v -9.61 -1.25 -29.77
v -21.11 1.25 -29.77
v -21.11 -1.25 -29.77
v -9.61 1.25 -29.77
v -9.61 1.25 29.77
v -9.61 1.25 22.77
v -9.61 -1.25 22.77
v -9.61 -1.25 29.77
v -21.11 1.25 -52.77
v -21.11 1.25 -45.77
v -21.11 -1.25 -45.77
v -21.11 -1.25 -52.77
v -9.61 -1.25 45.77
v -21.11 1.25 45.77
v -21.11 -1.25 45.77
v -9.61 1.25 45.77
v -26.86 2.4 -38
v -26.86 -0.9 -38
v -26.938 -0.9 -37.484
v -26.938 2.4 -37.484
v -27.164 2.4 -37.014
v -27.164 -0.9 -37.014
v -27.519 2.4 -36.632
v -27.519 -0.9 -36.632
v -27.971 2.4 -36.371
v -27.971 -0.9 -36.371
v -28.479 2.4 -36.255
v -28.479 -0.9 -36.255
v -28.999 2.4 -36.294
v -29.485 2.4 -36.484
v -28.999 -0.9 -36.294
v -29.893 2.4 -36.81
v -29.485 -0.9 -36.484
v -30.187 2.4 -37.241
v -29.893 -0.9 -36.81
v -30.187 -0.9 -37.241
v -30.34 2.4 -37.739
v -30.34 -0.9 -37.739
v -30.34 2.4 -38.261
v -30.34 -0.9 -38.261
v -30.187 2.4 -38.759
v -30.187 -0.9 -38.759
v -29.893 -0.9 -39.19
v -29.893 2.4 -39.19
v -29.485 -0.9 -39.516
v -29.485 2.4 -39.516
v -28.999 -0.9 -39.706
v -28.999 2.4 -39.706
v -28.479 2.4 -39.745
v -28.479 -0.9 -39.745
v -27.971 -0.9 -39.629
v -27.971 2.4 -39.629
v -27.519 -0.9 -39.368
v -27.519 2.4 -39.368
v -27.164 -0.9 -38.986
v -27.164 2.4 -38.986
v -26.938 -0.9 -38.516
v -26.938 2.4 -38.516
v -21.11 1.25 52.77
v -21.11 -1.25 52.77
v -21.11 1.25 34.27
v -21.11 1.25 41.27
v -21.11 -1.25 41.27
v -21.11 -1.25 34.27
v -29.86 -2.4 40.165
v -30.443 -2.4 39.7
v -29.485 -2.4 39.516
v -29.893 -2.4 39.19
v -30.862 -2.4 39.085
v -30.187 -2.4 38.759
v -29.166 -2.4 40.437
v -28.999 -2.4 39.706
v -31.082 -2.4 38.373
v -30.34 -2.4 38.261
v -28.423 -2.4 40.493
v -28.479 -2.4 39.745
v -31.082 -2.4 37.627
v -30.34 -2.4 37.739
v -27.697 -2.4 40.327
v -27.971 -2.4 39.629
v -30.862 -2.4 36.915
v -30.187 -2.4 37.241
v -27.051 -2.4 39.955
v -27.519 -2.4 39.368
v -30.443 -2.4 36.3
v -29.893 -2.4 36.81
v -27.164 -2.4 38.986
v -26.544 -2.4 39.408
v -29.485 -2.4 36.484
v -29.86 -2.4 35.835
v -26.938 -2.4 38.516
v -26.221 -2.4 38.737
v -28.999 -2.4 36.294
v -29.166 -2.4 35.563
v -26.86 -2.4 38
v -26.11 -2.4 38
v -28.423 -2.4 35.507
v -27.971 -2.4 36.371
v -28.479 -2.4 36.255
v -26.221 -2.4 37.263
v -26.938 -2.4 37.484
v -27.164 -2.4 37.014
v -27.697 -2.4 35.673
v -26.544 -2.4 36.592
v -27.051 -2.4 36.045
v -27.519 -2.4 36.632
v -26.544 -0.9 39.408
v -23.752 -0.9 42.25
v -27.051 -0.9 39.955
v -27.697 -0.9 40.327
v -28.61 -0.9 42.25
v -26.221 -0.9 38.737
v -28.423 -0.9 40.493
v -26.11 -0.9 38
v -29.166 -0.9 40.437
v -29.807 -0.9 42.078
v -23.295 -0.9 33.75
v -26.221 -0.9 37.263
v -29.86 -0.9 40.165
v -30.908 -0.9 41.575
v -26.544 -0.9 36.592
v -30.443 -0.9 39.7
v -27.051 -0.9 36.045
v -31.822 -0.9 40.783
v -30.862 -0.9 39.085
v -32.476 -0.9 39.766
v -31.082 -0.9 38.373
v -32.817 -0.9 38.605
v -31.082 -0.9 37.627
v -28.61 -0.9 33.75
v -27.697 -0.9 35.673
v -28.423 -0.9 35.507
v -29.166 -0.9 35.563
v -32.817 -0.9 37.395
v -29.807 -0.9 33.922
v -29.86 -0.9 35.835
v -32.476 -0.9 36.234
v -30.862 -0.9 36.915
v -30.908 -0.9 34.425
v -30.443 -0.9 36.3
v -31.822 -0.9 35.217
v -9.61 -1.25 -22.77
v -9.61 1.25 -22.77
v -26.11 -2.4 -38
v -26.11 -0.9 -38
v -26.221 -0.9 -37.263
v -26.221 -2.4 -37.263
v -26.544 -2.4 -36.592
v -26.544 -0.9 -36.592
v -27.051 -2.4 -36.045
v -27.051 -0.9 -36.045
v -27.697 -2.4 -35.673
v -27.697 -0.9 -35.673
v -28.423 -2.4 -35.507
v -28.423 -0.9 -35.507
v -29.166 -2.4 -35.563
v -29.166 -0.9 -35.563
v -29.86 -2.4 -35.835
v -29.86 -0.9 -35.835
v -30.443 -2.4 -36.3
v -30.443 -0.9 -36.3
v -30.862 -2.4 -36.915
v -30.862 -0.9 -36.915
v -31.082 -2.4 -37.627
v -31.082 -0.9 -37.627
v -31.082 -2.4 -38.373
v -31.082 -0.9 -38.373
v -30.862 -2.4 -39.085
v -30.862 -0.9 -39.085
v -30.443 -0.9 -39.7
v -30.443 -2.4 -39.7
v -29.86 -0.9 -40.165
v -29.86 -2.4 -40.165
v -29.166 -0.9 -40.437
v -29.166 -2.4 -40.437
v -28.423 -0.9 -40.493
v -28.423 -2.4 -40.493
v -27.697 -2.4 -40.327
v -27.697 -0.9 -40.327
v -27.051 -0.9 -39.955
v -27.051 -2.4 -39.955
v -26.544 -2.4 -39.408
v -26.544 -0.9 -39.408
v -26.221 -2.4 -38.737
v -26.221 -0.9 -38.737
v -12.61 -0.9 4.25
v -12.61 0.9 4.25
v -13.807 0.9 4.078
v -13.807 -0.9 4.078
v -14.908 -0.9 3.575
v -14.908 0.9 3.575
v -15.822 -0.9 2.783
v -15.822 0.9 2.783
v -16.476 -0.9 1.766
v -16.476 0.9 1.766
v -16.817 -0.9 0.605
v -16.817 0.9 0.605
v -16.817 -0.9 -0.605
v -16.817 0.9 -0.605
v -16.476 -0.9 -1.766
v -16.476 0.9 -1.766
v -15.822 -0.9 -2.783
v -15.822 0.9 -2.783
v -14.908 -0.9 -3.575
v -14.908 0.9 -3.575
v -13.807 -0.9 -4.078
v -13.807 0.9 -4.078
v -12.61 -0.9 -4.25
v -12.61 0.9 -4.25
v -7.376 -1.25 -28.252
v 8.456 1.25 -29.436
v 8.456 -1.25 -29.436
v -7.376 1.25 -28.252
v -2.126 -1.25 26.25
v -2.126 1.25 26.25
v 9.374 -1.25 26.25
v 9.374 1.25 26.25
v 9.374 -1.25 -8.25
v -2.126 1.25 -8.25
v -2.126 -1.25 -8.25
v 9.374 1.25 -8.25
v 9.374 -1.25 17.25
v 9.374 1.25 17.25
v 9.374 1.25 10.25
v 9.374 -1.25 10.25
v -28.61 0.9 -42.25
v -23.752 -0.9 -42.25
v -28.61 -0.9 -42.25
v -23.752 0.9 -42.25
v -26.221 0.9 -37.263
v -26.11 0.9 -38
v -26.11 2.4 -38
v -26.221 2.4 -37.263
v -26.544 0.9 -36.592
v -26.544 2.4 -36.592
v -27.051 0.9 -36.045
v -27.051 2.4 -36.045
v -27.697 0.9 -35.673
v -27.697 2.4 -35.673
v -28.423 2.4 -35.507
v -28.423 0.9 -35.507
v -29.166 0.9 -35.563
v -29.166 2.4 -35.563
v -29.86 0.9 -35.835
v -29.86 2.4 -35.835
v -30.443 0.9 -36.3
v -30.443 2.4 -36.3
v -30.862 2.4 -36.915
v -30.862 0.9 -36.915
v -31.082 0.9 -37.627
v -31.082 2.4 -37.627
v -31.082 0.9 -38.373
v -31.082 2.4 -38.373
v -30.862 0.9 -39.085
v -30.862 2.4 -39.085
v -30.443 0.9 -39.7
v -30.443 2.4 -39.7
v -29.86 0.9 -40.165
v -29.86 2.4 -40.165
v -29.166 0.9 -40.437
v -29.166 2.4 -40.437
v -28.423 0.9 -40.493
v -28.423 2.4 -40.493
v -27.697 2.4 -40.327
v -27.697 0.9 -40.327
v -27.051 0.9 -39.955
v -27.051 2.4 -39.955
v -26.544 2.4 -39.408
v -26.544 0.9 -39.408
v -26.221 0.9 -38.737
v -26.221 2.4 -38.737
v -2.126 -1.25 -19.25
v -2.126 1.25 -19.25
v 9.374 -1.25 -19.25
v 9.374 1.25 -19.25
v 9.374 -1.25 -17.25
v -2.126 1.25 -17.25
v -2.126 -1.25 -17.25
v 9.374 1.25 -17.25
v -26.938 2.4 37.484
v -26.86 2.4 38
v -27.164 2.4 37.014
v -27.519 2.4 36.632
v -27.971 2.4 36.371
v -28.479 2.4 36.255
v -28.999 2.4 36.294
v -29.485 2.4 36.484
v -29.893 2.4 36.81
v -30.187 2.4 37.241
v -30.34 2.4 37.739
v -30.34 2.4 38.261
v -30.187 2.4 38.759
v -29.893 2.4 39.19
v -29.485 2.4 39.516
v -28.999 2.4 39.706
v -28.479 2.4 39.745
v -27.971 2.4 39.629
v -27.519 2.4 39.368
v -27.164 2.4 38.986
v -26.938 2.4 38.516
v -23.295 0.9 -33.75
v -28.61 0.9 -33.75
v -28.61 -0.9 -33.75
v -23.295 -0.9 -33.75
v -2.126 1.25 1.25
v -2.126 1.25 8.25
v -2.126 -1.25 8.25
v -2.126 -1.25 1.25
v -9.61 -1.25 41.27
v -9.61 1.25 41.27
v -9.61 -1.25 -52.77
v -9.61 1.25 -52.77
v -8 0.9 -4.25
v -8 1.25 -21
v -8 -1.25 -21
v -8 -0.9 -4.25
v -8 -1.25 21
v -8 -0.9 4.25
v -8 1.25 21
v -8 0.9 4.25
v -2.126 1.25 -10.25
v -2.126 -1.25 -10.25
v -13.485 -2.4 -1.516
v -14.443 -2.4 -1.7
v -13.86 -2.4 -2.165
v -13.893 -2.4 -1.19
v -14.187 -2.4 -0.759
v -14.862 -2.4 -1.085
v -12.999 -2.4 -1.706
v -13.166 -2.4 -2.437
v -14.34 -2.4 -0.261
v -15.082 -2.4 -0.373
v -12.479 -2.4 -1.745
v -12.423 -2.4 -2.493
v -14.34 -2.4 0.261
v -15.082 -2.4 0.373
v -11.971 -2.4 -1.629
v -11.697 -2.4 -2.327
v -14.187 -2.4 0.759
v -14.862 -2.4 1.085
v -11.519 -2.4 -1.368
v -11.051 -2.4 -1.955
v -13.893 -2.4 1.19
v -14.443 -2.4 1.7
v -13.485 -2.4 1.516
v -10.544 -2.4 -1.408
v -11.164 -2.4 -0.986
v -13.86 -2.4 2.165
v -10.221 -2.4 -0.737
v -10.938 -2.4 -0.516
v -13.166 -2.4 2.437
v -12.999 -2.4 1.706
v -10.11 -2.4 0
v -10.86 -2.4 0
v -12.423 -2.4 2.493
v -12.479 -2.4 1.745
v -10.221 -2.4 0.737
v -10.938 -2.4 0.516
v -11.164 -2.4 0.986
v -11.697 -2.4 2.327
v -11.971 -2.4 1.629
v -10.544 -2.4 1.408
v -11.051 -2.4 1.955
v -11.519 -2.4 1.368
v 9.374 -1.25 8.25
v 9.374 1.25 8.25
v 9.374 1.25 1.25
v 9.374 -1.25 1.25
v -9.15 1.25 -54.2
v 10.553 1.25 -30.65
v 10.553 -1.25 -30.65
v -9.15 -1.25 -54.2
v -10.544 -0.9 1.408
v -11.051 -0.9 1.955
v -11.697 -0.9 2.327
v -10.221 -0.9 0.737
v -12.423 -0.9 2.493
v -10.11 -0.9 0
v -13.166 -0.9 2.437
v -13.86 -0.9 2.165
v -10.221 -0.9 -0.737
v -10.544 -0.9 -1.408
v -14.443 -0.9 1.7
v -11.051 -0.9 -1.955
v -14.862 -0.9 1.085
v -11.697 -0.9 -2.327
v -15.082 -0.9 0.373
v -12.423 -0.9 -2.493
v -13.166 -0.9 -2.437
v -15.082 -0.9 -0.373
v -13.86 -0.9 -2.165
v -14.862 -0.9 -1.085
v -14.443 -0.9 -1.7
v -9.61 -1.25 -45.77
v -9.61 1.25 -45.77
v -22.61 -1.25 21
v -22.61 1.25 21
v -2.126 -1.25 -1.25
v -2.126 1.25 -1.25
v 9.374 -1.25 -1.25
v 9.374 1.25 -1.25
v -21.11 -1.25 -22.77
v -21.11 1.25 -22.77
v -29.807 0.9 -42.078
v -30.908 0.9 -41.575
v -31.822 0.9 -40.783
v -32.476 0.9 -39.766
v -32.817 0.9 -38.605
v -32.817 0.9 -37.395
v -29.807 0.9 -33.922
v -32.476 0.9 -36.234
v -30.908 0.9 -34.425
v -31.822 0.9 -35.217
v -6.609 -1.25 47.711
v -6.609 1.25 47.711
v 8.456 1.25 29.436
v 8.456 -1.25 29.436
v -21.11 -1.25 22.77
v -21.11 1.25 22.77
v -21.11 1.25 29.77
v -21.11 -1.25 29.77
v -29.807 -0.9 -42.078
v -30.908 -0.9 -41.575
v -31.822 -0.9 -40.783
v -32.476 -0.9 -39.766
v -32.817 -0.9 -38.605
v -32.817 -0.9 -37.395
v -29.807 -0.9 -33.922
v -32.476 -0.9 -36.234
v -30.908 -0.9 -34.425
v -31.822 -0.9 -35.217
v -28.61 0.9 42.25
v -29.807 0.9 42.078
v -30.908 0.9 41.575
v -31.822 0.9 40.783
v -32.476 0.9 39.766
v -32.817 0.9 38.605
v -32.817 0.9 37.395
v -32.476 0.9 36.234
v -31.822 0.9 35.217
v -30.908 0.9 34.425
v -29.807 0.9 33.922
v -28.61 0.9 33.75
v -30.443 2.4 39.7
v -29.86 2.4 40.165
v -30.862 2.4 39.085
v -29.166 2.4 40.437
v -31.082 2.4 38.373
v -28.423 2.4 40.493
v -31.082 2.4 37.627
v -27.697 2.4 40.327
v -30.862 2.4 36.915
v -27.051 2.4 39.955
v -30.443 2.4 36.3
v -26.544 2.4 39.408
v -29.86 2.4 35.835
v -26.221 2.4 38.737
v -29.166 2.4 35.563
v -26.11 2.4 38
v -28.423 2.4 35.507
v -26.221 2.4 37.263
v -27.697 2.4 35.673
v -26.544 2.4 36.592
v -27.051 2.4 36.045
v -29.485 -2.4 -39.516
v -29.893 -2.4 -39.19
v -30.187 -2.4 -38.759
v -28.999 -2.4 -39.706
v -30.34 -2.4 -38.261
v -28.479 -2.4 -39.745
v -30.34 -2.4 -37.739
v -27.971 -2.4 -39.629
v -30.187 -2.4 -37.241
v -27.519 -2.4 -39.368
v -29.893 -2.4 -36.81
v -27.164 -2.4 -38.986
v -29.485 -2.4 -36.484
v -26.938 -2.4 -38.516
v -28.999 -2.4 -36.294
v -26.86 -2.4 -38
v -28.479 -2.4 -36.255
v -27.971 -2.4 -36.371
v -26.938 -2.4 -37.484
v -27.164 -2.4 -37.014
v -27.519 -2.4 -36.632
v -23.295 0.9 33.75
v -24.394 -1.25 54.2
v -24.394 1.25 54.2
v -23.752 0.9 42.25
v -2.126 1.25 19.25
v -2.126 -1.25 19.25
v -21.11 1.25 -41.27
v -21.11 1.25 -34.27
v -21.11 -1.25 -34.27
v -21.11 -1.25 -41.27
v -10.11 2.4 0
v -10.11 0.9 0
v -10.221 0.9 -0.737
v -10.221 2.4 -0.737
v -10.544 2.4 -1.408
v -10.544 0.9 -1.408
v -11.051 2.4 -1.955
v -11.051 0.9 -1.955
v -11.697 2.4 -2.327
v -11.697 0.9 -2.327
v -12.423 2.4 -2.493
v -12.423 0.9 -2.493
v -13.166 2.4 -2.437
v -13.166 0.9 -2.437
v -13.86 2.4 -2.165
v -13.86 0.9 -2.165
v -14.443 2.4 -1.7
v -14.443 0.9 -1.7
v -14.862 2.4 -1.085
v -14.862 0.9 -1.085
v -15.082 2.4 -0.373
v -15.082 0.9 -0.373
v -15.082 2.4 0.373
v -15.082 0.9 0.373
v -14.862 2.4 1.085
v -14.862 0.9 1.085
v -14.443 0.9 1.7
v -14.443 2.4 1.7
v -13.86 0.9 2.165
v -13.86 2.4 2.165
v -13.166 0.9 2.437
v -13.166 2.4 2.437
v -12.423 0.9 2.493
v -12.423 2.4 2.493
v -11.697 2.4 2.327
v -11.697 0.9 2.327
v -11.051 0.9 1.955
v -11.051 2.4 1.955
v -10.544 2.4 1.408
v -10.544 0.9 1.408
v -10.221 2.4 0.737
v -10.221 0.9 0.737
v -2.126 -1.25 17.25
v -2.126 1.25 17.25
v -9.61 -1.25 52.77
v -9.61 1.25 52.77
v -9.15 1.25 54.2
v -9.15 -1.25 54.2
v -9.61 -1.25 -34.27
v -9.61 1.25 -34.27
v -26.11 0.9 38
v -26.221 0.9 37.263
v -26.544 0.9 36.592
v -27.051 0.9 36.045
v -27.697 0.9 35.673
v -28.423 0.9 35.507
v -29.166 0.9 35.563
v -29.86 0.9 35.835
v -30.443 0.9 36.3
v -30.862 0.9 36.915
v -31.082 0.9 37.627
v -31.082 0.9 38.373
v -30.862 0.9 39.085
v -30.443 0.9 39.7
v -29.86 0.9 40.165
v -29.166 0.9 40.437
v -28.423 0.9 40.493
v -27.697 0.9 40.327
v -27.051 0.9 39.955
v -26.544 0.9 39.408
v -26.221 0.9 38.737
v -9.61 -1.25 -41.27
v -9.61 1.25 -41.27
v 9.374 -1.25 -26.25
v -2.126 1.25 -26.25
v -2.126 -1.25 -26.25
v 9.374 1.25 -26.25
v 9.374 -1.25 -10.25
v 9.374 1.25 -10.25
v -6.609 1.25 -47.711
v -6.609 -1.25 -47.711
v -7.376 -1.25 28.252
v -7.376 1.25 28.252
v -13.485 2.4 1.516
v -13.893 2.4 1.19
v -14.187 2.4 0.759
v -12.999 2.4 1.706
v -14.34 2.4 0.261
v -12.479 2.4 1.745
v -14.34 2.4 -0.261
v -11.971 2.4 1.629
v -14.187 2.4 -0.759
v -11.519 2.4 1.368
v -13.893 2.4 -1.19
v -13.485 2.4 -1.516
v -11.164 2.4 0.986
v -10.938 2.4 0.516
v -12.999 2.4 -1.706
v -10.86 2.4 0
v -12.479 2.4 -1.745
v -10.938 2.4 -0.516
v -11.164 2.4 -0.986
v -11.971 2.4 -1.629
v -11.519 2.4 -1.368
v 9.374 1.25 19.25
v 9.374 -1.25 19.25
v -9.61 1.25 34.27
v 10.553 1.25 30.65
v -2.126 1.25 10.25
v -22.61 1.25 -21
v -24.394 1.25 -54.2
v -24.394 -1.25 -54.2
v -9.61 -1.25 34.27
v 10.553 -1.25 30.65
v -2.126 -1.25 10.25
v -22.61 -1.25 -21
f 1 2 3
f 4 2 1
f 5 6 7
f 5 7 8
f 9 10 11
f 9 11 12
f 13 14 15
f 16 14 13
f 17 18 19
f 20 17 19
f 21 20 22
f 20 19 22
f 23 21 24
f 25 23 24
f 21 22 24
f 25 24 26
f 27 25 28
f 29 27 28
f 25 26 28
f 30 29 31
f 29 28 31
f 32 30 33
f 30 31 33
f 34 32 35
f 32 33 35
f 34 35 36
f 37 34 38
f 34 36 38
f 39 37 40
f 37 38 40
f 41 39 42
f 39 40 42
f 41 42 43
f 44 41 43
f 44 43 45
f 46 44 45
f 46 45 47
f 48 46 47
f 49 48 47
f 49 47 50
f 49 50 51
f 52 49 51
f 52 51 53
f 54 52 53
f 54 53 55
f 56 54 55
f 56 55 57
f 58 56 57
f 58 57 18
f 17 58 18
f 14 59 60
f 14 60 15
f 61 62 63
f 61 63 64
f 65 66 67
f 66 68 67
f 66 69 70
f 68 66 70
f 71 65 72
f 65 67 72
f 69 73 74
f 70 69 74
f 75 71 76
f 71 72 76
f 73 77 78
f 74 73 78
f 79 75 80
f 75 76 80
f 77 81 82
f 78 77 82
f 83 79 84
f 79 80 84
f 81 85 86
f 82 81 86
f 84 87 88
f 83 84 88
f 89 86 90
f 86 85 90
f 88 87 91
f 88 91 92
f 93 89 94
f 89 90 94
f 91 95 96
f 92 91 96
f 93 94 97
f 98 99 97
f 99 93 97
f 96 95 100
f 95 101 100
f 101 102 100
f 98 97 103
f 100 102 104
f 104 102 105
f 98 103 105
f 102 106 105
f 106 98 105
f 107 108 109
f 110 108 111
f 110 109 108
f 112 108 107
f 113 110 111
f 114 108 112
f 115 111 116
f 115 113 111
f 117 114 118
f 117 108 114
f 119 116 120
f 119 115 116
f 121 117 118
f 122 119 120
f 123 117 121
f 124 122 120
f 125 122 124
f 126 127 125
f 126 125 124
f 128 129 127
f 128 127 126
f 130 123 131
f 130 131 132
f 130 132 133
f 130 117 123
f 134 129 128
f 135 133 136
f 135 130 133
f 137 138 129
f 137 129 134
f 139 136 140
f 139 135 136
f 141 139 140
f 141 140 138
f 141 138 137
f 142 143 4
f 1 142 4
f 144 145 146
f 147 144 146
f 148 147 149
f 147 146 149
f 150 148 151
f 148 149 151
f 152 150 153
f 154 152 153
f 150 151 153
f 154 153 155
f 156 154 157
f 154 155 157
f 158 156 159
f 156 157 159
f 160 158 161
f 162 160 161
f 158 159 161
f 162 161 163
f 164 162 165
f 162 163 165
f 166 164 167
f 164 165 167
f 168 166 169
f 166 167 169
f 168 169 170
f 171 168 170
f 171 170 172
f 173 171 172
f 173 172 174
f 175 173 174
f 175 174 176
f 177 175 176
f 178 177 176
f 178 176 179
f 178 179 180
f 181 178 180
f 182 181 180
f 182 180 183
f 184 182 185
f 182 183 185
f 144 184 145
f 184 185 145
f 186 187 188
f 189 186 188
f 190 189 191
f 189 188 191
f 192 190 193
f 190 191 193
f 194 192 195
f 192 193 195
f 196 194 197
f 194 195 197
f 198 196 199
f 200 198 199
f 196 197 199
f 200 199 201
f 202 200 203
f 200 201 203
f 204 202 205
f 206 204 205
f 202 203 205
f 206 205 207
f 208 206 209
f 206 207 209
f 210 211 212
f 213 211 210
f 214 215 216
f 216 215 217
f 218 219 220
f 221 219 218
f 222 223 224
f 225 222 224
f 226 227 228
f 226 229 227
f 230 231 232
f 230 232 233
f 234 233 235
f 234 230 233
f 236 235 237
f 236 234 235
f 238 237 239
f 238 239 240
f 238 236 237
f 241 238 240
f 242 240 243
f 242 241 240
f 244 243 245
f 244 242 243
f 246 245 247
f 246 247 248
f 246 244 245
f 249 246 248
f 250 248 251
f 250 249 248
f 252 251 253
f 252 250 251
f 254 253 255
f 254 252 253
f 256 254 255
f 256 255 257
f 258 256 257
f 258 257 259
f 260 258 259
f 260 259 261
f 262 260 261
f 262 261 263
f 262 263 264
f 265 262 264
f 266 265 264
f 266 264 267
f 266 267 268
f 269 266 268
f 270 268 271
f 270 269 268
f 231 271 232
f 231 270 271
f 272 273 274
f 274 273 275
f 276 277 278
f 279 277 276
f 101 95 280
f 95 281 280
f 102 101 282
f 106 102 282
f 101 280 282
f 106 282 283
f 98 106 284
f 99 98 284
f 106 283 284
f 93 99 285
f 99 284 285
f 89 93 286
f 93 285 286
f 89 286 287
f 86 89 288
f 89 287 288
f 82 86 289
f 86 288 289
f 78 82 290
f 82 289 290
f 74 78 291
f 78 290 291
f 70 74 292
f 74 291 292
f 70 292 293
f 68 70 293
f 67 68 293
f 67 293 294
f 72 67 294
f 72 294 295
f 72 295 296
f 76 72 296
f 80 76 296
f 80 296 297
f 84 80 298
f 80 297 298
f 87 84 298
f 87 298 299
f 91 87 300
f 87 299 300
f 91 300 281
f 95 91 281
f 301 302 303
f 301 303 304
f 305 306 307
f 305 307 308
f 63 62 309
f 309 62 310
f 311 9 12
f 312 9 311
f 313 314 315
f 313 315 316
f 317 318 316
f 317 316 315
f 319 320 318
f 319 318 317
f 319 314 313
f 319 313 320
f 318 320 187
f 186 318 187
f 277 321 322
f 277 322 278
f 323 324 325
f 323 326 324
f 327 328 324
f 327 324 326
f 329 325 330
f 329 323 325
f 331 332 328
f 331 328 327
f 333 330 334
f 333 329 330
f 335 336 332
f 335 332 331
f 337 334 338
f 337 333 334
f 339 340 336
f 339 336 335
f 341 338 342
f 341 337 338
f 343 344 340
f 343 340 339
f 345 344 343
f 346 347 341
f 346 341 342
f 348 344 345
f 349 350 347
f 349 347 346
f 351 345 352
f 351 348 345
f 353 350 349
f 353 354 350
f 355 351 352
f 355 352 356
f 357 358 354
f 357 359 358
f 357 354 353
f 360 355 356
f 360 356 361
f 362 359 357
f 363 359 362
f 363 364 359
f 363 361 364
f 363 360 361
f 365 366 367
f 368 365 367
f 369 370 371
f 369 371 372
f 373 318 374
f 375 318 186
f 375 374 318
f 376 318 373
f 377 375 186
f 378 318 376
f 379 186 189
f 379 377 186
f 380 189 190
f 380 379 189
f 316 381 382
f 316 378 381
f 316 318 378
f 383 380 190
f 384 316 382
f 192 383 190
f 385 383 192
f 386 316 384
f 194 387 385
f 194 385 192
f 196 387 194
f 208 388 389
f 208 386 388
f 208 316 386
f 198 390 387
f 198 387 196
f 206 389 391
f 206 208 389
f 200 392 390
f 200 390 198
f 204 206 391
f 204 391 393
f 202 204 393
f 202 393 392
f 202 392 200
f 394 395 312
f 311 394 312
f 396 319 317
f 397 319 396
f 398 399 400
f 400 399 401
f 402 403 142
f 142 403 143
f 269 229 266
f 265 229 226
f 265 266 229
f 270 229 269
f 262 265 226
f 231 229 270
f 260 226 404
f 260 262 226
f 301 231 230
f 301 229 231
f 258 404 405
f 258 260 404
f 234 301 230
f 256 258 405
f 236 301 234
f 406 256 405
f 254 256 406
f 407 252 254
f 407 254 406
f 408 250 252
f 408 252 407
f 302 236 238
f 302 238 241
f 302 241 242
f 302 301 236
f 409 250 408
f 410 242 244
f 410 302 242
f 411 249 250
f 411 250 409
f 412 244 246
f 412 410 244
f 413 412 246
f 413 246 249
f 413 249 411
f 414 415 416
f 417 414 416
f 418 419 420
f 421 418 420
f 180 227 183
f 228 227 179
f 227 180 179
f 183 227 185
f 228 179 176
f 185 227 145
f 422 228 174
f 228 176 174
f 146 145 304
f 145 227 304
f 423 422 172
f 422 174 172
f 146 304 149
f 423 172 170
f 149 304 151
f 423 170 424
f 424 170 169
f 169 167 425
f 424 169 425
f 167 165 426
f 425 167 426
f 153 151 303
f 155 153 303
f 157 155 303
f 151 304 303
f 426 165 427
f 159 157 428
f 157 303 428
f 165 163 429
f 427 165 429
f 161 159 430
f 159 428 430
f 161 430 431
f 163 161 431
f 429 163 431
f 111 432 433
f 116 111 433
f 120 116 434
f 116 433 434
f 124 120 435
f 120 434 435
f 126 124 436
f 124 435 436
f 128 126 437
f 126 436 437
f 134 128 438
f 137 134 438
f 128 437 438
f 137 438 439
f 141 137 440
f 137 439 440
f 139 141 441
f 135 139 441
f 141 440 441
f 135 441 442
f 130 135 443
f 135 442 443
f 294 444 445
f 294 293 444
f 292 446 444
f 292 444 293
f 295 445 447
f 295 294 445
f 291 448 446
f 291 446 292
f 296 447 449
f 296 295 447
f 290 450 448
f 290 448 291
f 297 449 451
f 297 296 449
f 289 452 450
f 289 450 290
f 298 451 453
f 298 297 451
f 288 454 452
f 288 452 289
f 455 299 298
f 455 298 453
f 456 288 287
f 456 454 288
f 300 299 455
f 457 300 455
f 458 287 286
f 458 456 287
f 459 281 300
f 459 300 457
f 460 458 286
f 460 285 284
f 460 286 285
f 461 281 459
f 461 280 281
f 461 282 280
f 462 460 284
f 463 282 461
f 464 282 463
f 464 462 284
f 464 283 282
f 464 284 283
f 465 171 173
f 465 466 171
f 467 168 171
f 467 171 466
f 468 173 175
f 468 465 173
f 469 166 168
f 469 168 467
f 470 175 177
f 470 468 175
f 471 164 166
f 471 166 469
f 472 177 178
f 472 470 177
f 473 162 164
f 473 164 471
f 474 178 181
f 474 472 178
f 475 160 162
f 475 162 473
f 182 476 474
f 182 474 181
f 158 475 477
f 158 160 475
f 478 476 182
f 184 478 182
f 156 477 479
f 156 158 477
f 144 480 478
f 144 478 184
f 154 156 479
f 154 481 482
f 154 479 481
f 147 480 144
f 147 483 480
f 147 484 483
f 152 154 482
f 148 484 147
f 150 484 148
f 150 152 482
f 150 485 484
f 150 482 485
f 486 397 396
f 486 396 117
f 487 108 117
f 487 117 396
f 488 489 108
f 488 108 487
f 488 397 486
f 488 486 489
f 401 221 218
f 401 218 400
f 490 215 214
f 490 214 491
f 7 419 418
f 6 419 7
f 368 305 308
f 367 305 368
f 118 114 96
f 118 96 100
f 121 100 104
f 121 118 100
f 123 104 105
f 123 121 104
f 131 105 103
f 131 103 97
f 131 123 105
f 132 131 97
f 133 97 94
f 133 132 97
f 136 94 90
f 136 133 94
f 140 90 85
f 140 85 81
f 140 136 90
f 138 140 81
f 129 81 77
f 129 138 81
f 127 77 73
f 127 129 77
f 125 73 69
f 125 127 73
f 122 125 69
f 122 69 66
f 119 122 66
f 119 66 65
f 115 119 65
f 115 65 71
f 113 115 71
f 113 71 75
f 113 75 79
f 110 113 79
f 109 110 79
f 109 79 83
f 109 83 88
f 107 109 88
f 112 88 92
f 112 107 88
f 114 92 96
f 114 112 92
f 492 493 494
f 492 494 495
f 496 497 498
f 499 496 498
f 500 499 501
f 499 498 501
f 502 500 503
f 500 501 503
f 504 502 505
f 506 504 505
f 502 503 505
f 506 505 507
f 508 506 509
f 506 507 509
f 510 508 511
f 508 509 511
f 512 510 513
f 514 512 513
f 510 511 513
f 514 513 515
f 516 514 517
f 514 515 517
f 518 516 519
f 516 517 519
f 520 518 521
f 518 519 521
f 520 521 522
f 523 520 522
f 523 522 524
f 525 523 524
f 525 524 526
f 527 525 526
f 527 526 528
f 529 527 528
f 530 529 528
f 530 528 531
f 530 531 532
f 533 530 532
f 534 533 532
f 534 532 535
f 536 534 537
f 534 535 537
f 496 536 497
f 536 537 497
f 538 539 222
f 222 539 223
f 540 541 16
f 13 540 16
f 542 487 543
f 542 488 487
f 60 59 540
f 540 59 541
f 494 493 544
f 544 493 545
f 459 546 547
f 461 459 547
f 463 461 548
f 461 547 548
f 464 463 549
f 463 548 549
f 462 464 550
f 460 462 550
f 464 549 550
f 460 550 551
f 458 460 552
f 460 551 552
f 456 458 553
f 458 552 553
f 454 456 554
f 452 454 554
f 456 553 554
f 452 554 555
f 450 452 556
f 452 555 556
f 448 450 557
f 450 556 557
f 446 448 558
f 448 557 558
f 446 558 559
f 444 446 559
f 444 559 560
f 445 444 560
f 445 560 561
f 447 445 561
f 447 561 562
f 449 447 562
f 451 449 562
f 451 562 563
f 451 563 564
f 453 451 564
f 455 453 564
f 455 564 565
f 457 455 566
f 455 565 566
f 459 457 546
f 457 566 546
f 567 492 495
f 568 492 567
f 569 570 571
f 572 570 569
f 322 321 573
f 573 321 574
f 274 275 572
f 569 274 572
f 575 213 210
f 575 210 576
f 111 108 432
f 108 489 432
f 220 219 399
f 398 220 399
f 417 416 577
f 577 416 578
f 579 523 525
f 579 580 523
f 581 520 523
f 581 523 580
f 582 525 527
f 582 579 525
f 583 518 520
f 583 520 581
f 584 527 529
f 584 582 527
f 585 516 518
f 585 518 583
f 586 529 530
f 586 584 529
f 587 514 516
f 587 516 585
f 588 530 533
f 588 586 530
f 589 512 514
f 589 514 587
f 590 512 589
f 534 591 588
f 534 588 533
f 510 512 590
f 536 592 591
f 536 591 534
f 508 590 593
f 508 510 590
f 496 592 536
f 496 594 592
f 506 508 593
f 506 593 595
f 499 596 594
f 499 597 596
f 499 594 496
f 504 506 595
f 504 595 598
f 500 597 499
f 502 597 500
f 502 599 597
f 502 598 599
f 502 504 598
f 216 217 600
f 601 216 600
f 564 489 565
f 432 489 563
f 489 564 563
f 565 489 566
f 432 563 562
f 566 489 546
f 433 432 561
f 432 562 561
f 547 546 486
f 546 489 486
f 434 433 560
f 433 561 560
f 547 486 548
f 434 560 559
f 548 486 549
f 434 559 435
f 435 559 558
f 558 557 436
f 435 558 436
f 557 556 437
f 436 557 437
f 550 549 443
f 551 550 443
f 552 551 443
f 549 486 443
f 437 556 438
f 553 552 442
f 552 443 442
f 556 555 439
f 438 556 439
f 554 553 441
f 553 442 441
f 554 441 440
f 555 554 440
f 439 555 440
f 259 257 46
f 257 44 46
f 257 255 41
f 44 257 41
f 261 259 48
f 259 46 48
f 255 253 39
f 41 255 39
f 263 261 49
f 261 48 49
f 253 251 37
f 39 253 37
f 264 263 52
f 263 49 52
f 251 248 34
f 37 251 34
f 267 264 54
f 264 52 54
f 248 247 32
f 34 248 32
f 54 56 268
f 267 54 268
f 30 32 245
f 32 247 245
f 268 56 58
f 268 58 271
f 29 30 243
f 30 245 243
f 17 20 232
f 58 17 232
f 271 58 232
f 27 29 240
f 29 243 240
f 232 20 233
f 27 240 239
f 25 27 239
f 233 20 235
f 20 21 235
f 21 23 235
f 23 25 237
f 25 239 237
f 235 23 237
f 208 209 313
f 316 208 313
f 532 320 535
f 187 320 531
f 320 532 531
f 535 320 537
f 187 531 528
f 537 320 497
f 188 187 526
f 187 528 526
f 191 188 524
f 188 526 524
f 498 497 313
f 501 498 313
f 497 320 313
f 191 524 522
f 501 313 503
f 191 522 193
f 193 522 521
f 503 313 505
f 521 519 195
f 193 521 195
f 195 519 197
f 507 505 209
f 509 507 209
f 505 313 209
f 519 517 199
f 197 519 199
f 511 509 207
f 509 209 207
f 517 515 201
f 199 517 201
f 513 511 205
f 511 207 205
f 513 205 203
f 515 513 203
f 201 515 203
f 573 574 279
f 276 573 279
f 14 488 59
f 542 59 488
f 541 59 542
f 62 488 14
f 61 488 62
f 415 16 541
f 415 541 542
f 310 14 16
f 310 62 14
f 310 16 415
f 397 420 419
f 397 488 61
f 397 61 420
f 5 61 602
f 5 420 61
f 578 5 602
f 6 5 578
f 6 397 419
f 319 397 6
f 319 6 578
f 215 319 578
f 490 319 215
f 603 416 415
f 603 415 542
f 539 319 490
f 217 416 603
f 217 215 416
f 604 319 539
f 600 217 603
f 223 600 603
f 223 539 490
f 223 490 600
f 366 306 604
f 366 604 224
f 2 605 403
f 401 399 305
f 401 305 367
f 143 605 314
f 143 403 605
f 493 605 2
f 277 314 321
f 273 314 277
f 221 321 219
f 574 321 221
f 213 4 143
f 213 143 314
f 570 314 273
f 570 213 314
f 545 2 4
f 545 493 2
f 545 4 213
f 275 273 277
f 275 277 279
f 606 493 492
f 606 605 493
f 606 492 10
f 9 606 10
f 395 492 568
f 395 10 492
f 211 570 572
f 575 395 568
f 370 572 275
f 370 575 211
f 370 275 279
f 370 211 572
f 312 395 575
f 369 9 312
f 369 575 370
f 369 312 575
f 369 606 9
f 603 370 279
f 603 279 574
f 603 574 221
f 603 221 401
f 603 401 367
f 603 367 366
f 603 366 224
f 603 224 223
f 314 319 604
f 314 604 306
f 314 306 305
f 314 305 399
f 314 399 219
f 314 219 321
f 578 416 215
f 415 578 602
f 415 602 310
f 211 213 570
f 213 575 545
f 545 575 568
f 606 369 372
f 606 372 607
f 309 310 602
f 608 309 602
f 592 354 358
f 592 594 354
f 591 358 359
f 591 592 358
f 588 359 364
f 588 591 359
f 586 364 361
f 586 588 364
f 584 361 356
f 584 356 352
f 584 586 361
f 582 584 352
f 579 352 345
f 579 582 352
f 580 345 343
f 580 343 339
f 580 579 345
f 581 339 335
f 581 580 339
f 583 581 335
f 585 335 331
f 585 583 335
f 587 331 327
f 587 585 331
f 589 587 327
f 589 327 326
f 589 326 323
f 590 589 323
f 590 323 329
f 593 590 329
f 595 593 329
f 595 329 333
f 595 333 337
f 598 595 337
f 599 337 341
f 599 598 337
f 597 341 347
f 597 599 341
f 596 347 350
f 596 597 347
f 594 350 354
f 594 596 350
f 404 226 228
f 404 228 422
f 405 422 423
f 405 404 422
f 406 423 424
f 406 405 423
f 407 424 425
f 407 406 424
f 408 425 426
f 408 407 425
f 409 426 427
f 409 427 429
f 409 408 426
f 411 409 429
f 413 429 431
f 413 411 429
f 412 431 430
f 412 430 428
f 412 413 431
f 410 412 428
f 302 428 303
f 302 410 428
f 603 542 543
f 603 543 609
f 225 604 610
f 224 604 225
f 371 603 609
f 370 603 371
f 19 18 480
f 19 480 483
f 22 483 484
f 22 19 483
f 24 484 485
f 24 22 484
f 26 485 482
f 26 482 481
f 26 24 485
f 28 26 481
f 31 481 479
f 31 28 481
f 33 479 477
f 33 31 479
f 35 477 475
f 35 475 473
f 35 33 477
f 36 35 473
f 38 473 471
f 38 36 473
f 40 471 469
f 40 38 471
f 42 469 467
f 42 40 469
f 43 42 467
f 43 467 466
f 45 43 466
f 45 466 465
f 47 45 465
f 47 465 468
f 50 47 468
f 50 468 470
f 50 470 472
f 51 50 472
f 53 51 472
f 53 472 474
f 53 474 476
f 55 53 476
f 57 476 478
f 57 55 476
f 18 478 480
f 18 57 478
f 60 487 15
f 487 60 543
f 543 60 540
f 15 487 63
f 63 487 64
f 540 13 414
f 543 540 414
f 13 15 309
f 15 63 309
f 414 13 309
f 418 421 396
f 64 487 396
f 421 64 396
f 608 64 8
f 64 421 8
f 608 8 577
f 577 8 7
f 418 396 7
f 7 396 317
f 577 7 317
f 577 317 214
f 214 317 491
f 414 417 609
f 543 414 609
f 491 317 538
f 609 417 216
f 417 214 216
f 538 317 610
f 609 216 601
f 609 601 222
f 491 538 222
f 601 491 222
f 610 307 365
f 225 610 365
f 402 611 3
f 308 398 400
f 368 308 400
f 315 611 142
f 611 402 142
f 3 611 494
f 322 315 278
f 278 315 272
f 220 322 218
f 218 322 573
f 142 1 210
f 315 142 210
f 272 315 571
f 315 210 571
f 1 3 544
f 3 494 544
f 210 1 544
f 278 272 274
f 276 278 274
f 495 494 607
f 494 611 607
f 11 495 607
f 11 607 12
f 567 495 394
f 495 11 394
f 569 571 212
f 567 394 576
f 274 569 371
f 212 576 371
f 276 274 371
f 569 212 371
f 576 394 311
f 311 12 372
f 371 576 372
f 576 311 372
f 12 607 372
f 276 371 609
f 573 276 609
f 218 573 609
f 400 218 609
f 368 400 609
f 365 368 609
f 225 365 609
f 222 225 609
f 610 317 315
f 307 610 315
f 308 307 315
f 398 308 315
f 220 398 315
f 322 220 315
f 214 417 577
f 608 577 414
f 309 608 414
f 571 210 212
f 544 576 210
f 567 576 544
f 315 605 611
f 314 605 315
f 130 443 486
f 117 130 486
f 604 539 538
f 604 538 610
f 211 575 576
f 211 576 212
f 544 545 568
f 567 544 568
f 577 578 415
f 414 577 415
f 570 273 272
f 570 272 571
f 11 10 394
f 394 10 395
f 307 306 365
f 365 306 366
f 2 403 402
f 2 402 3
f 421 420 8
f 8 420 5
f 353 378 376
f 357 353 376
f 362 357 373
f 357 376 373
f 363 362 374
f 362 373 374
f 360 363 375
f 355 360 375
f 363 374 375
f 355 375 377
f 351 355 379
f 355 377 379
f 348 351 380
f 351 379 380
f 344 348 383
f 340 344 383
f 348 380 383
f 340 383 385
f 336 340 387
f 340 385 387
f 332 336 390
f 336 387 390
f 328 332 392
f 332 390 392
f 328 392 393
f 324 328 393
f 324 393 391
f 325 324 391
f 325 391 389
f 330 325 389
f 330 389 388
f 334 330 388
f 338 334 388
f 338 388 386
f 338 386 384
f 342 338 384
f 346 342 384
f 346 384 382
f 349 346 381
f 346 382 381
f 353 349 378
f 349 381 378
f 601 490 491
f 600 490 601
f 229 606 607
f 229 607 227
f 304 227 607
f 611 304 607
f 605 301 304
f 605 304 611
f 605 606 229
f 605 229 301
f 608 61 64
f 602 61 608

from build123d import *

# Parameters (mm, degrees)
RESSALTO_EXTRUS_O1_DEPTH         = 1.25
ESBO_O5_W                        = 11.5
ESBO_O5_H                        = 7
CORTE_EXTRUS_O1_DEPTH            = 2.5
PADR_O_LINEAR1_COUNT             = 3
PADR_O_LINEAR1_PITCH             = 9
ESBO_O8_W                        = 11.5
ESBO_O8_H                        = 7
CORTE_EXTRUS_O4_DEPTH            = 10
PADR_O_LINEAR3_COUNT             = 3
PADR_O_LINEAR3_PITCH             = 11.5
ESPELHAR1_COPY_1_SKETCH_W        = 11.5
ESPELHAR1_COPY_1_SKETCH_H        = 7
ESPELHAR1_COPY_1_DEPTH           = 10
ESPELHAR1_COPY_2_SKETCH_W        = 11.5
ESPELHAR1_COPY_2_SKETCH_H        = 7
ESPELHAR1_COPY_2_DEPTH           = 10
ESPELHAR2_COPY_1_SKETCH_W        = 11.5
ESPELHAR2_COPY_1_SKETCH_H        = 7
ESPELHAR2_COPY_1_DEPTH           = 2.5
ESPELHAR2_COPY_2_SKETCH_W        = 11.5
ESPELHAR2_COPY_2_SKETCH_H        = 7
ESPELHAR2_COPY_2_DEPTH           = 2.5
CORTE_EXTRUS_O5_DEPTH            = 10
ESBO_O10_R                       = 1.75
RESSALTO_EXTRUS_O2_DEPTH         = 0.9
ESBO_O11_R                       = 2.5
ESBO_O11_R_2                     = 1.75
RESSALTO_EXTRUS_O3_DEPTH         = 1.5
PADR_O_LINEAR4_COUNT             = 2
PADR_O_LINEAR4_PITCH             = 38
PADR_O_LINEAR4_COUNT_DIR2        = 2
PADR_O_LINEAR4_PITCH_DIR2        = 16
PADR_O_LINEAR4_COPY_1_SKETCH_R   = 2.5
PADR_O_LINEAR4_COPY_1_SKETCH_R_2 = 1.75
PADR_O_LINEAR4_COPY_1_DEPTH      = 1.5
ESPELHAR5_COPY_1_SKETCH_R        = 2.5
ESPELHAR5_COPY_1_SKETCH_R_2      = 1.75
ESPELHAR5_COPY_1_DEPTH           = 1.5


with BuildPart() as part:
    # Esboço1 → Ressalto-extrusão1 (new body, symmetric)
    with BuildSketch(Plane(origin=(0, 0, 0), x_dir=(1, 0, 0), z_dir=(0, 1, 0))):
        Polygon((-24.393815238, -54.2), (-9.15, -54.2), (10.553192421, -30.65), (10.553192421, 30.65), (-9.15, 54.2), (-24.393815238, 54.2), (-22.610275313, 21), (-8, 21), (-8, -21), (-22.610275313, -21), align=None)
    extrude(amount=RESSALTO_EXTRUS_O1_DEPTH, both=True)

    # Esboço5 → Corte-extrusão1 (cut)
    with BuildSketch(Plane(origin=(0, 1.25, 0), x_dir=(1, 0, 0), z_dir=(0, 1, 0))):
        with Locations((3.624348025, -4.75)):
            Rectangle(ESBO_O5_W, ESBO_O5_H)
    corte_extrus_o1 = extrude(amount=-CORTE_EXTRUS_O1_DEPTH, mode=Mode.SUBTRACT)

    # Padrão linear1: Corte-extrusão1 ×3
    with Locations(*[(0, 0, i * PADR_O_LINEAR1_PITCH) for i in range(1, PADR_O_LINEAR1_COUNT)]):
        add(corte_extrus_o1, mode=Mode.SUBTRACT)

    # Esboço8 → Corte-extrusão4 (cut)
    with BuildSketch(Plane(origin=(0, 1.25, 0), x_dir=(1, 0, 0), z_dir=(0, 1, 0))):
        with Locations((-15.36, 26.27)):
            Rectangle(ESBO_O8_W, ESBO_O8_H)
    corte_extrus_o4 = extrude(amount=-CORTE_EXTRUS_O4_DEPTH, mode=Mode.SUBTRACT)

    # Padrão linear3: Corte-extrusão4 ×3
    with Locations(*[(0, 0, -i * PADR_O_LINEAR3_PITCH) for i in range(1, PADR_O_LINEAR3_COUNT)]):
        add(corte_extrus_o4, mode=Mode.SUBTRACT)

    # Espelhar1: Corte-extrusão4 across plane
    add(corte_extrus_o4.mirror(Plane.XY), mode=Mode.SUBTRACT)

    # Espelhar1 copy 1 sketch → Espelhar1 copy 1 (cut)
    with BuildSketch(Plane(origin=(0, 1.25, 11.5), x_dir=(1, 0, 0), z_dir=(0, 1, 0))):
        with Locations((-15.36, -26.27)):
            Rectangle(ESPELHAR1_COPY_1_SKETCH_W, ESPELHAR1_COPY_1_SKETCH_H)
    extrude(amount=-ESPELHAR1_COPY_1_DEPTH, mode=Mode.SUBTRACT)

    # Espelhar1 copy 2 sketch → Espelhar1 copy 2 (cut)
    with BuildSketch(Plane(origin=(0, 1.25, 23), x_dir=(1, 0, 0), z_dir=(0, 1, 0))):
        with Locations((-15.36, -26.27)):
            Rectangle(ESPELHAR1_COPY_2_SKETCH_W, ESPELHAR1_COPY_2_SKETCH_H)
    extrude(amount=-ESPELHAR1_COPY_2_DEPTH, mode=Mode.SUBTRACT)

    # Espelhar2: Corte-extrusão1 across plane
    add(corte_extrus_o1.mirror(Plane.XY), mode=Mode.SUBTRACT)

    # Espelhar2 copy 1 sketch → Espelhar2 copy 1 (cut)
    with BuildSketch(Plane(origin=(0, 1.25, -9), x_dir=(1, 0, 0), z_dir=(0, 1, 0))):
        with Locations((3.624348025, 4.75)):
            Rectangle(ESPELHAR2_COPY_1_SKETCH_W, ESPELHAR2_COPY_1_SKETCH_H)
    extrude(amount=-ESPELHAR2_COPY_1_DEPTH, mode=Mode.SUBTRACT)

    # Espelhar2 copy 2 sketch → Espelhar2 copy 2 (cut)
    with BuildSketch(Plane(origin=(0, 1.25, -18), x_dir=(1, 0, 0), z_dir=(0, 1, 0))):
        with Locations((3.624348025, 4.75)):
            Rectangle(ESPELHAR2_COPY_2_SKETCH_W, ESPELHAR2_COPY_2_SKETCH_H)
    extrude(amount=-ESPELHAR2_COPY_2_DEPTH, mode=Mode.SUBTRACT)

    # Esboço9 → Corte-extrusão5 (cut)
    with BuildSketch(Plane(origin=(0, 1.25, 0), x_dir=(1, 0, 0), z_dir=(0, 1, 0))):
        Polygon((8.455719459, -29.435601452), (-7.375936588, -28.25205491), (-6.609249814, -47.710896474), align=None)
    corte_extrus_o5 = extrude(amount=-CORTE_EXTRUS_O5_DEPTH, mode=Mode.SUBTRACT)

    # Espelhar3: Corte-extrusão5 across plane
    add(corte_extrus_o5.mirror(Plane.XY), mode=Mode.SUBTRACT)

    # Esboço10 → Ressalto-extrusão2 (add, symmetric)
    with BuildSketch(Plane(origin=(0, 0, 0), x_dir=(1, 0, 0), z_dir=(0, 1, 0))):
        with BuildLine():
            Line((-28.61, -33.75), (-23.29521911, -33.75))
            Line((-23.29521911, -33.75), (-23.751848307, -42.25))
            Line((-23.751848307, -42.25), (-28.61, -42.25))
            ThreePointArc((-28.61, -42.25), (-32.86, -38), (-28.61, -33.75))
        make_face()
        with Locations((-28.61, -38)):
            Circle(ESBO_O10_R, mode=Mode.SUBTRACT)
    ressalto_extrus_o2 = extrude(amount=RESSALTO_EXTRUS_O2_DEPTH, both=True)

    # Esboço11 → Ressalto-extrusão3 (add)
    with BuildSketch(Plane(origin=(0, 0.9, 0), x_dir=(1, 0, 0), z_dir=(0, 1, 0))):
        with Locations((-28.61, -38)):
            Circle(ESBO_O11_R)
        with Locations((-28.61, -38)):
            Circle(ESBO_O11_R_2, mode=Mode.SUBTRACT)
    ressalto_extrus_o3 = extrude(amount=RESSALTO_EXTRUS_O3_DEPTH)

    # Espelhar4: Ressalto-extrusão3 across plane
    add(ressalto_extrus_o3.mirror(Plane.ZX))

    # Padrão linear4: Ressalto-extrusão2, Ressalto-extrus_o3 2 × 2, 2 skipped
    with Locations(*[(j * PADR_O_LINEAR4_PITCH_DIR2, 0, -i * PADR_O_LINEAR4_PITCH) for i in range(PADR_O_LINEAR4_COUNT) for j in range(PADR_O_LINEAR4_COUNT_DIR2) if (i, j) not in ((0, 0), (0, 1), (1, 0))]):
        add(ressalto_extrus_o2)
        add(ressalto_extrus_o3)

    # Padrão linear4 copy 1 sketch → Padrão linear4 copy 1 (add)
    with BuildSketch(Plane(origin=(16, -0.9, -38), x_dir=(1, 0, 0), z_dir=(0, -1, 0))):
        with Locations((-28.61, 38)):
            Circle(PADR_O_LINEAR4_COPY_1_SKETCH_R)
        with Locations((-28.61, 38)):
            Circle(PADR_O_LINEAR4_COPY_1_SKETCH_R_2, mode=Mode.SUBTRACT)
    extrude(amount=PADR_O_LINEAR4_COPY_1_DEPTH)

    # Espelhar5: Ressalto-extrusão3, Ressalto-extrusão2 across plane
    add(ressalto_extrus_o3.mirror(Plane.XY))
    add(ressalto_extrus_o2.mirror(Plane.XY))

    # Espelhar5 copy 1 sketch → Espelhar5 copy 1 (add)
    with BuildSketch(Plane.XZ.offset(0.9)):
        with Locations((-28.61, -38)):
            Circle(ESPELHAR5_COPY_1_SKETCH_R)
        with Locations((-28.61, -38)):
            Circle(ESPELHAR5_COPY_1_SKETCH_R_2, mode=Mode.SUBTRACT)
    extrude(amount=ESPELHAR5_COPY_1_DEPTH)


solid = part.part
